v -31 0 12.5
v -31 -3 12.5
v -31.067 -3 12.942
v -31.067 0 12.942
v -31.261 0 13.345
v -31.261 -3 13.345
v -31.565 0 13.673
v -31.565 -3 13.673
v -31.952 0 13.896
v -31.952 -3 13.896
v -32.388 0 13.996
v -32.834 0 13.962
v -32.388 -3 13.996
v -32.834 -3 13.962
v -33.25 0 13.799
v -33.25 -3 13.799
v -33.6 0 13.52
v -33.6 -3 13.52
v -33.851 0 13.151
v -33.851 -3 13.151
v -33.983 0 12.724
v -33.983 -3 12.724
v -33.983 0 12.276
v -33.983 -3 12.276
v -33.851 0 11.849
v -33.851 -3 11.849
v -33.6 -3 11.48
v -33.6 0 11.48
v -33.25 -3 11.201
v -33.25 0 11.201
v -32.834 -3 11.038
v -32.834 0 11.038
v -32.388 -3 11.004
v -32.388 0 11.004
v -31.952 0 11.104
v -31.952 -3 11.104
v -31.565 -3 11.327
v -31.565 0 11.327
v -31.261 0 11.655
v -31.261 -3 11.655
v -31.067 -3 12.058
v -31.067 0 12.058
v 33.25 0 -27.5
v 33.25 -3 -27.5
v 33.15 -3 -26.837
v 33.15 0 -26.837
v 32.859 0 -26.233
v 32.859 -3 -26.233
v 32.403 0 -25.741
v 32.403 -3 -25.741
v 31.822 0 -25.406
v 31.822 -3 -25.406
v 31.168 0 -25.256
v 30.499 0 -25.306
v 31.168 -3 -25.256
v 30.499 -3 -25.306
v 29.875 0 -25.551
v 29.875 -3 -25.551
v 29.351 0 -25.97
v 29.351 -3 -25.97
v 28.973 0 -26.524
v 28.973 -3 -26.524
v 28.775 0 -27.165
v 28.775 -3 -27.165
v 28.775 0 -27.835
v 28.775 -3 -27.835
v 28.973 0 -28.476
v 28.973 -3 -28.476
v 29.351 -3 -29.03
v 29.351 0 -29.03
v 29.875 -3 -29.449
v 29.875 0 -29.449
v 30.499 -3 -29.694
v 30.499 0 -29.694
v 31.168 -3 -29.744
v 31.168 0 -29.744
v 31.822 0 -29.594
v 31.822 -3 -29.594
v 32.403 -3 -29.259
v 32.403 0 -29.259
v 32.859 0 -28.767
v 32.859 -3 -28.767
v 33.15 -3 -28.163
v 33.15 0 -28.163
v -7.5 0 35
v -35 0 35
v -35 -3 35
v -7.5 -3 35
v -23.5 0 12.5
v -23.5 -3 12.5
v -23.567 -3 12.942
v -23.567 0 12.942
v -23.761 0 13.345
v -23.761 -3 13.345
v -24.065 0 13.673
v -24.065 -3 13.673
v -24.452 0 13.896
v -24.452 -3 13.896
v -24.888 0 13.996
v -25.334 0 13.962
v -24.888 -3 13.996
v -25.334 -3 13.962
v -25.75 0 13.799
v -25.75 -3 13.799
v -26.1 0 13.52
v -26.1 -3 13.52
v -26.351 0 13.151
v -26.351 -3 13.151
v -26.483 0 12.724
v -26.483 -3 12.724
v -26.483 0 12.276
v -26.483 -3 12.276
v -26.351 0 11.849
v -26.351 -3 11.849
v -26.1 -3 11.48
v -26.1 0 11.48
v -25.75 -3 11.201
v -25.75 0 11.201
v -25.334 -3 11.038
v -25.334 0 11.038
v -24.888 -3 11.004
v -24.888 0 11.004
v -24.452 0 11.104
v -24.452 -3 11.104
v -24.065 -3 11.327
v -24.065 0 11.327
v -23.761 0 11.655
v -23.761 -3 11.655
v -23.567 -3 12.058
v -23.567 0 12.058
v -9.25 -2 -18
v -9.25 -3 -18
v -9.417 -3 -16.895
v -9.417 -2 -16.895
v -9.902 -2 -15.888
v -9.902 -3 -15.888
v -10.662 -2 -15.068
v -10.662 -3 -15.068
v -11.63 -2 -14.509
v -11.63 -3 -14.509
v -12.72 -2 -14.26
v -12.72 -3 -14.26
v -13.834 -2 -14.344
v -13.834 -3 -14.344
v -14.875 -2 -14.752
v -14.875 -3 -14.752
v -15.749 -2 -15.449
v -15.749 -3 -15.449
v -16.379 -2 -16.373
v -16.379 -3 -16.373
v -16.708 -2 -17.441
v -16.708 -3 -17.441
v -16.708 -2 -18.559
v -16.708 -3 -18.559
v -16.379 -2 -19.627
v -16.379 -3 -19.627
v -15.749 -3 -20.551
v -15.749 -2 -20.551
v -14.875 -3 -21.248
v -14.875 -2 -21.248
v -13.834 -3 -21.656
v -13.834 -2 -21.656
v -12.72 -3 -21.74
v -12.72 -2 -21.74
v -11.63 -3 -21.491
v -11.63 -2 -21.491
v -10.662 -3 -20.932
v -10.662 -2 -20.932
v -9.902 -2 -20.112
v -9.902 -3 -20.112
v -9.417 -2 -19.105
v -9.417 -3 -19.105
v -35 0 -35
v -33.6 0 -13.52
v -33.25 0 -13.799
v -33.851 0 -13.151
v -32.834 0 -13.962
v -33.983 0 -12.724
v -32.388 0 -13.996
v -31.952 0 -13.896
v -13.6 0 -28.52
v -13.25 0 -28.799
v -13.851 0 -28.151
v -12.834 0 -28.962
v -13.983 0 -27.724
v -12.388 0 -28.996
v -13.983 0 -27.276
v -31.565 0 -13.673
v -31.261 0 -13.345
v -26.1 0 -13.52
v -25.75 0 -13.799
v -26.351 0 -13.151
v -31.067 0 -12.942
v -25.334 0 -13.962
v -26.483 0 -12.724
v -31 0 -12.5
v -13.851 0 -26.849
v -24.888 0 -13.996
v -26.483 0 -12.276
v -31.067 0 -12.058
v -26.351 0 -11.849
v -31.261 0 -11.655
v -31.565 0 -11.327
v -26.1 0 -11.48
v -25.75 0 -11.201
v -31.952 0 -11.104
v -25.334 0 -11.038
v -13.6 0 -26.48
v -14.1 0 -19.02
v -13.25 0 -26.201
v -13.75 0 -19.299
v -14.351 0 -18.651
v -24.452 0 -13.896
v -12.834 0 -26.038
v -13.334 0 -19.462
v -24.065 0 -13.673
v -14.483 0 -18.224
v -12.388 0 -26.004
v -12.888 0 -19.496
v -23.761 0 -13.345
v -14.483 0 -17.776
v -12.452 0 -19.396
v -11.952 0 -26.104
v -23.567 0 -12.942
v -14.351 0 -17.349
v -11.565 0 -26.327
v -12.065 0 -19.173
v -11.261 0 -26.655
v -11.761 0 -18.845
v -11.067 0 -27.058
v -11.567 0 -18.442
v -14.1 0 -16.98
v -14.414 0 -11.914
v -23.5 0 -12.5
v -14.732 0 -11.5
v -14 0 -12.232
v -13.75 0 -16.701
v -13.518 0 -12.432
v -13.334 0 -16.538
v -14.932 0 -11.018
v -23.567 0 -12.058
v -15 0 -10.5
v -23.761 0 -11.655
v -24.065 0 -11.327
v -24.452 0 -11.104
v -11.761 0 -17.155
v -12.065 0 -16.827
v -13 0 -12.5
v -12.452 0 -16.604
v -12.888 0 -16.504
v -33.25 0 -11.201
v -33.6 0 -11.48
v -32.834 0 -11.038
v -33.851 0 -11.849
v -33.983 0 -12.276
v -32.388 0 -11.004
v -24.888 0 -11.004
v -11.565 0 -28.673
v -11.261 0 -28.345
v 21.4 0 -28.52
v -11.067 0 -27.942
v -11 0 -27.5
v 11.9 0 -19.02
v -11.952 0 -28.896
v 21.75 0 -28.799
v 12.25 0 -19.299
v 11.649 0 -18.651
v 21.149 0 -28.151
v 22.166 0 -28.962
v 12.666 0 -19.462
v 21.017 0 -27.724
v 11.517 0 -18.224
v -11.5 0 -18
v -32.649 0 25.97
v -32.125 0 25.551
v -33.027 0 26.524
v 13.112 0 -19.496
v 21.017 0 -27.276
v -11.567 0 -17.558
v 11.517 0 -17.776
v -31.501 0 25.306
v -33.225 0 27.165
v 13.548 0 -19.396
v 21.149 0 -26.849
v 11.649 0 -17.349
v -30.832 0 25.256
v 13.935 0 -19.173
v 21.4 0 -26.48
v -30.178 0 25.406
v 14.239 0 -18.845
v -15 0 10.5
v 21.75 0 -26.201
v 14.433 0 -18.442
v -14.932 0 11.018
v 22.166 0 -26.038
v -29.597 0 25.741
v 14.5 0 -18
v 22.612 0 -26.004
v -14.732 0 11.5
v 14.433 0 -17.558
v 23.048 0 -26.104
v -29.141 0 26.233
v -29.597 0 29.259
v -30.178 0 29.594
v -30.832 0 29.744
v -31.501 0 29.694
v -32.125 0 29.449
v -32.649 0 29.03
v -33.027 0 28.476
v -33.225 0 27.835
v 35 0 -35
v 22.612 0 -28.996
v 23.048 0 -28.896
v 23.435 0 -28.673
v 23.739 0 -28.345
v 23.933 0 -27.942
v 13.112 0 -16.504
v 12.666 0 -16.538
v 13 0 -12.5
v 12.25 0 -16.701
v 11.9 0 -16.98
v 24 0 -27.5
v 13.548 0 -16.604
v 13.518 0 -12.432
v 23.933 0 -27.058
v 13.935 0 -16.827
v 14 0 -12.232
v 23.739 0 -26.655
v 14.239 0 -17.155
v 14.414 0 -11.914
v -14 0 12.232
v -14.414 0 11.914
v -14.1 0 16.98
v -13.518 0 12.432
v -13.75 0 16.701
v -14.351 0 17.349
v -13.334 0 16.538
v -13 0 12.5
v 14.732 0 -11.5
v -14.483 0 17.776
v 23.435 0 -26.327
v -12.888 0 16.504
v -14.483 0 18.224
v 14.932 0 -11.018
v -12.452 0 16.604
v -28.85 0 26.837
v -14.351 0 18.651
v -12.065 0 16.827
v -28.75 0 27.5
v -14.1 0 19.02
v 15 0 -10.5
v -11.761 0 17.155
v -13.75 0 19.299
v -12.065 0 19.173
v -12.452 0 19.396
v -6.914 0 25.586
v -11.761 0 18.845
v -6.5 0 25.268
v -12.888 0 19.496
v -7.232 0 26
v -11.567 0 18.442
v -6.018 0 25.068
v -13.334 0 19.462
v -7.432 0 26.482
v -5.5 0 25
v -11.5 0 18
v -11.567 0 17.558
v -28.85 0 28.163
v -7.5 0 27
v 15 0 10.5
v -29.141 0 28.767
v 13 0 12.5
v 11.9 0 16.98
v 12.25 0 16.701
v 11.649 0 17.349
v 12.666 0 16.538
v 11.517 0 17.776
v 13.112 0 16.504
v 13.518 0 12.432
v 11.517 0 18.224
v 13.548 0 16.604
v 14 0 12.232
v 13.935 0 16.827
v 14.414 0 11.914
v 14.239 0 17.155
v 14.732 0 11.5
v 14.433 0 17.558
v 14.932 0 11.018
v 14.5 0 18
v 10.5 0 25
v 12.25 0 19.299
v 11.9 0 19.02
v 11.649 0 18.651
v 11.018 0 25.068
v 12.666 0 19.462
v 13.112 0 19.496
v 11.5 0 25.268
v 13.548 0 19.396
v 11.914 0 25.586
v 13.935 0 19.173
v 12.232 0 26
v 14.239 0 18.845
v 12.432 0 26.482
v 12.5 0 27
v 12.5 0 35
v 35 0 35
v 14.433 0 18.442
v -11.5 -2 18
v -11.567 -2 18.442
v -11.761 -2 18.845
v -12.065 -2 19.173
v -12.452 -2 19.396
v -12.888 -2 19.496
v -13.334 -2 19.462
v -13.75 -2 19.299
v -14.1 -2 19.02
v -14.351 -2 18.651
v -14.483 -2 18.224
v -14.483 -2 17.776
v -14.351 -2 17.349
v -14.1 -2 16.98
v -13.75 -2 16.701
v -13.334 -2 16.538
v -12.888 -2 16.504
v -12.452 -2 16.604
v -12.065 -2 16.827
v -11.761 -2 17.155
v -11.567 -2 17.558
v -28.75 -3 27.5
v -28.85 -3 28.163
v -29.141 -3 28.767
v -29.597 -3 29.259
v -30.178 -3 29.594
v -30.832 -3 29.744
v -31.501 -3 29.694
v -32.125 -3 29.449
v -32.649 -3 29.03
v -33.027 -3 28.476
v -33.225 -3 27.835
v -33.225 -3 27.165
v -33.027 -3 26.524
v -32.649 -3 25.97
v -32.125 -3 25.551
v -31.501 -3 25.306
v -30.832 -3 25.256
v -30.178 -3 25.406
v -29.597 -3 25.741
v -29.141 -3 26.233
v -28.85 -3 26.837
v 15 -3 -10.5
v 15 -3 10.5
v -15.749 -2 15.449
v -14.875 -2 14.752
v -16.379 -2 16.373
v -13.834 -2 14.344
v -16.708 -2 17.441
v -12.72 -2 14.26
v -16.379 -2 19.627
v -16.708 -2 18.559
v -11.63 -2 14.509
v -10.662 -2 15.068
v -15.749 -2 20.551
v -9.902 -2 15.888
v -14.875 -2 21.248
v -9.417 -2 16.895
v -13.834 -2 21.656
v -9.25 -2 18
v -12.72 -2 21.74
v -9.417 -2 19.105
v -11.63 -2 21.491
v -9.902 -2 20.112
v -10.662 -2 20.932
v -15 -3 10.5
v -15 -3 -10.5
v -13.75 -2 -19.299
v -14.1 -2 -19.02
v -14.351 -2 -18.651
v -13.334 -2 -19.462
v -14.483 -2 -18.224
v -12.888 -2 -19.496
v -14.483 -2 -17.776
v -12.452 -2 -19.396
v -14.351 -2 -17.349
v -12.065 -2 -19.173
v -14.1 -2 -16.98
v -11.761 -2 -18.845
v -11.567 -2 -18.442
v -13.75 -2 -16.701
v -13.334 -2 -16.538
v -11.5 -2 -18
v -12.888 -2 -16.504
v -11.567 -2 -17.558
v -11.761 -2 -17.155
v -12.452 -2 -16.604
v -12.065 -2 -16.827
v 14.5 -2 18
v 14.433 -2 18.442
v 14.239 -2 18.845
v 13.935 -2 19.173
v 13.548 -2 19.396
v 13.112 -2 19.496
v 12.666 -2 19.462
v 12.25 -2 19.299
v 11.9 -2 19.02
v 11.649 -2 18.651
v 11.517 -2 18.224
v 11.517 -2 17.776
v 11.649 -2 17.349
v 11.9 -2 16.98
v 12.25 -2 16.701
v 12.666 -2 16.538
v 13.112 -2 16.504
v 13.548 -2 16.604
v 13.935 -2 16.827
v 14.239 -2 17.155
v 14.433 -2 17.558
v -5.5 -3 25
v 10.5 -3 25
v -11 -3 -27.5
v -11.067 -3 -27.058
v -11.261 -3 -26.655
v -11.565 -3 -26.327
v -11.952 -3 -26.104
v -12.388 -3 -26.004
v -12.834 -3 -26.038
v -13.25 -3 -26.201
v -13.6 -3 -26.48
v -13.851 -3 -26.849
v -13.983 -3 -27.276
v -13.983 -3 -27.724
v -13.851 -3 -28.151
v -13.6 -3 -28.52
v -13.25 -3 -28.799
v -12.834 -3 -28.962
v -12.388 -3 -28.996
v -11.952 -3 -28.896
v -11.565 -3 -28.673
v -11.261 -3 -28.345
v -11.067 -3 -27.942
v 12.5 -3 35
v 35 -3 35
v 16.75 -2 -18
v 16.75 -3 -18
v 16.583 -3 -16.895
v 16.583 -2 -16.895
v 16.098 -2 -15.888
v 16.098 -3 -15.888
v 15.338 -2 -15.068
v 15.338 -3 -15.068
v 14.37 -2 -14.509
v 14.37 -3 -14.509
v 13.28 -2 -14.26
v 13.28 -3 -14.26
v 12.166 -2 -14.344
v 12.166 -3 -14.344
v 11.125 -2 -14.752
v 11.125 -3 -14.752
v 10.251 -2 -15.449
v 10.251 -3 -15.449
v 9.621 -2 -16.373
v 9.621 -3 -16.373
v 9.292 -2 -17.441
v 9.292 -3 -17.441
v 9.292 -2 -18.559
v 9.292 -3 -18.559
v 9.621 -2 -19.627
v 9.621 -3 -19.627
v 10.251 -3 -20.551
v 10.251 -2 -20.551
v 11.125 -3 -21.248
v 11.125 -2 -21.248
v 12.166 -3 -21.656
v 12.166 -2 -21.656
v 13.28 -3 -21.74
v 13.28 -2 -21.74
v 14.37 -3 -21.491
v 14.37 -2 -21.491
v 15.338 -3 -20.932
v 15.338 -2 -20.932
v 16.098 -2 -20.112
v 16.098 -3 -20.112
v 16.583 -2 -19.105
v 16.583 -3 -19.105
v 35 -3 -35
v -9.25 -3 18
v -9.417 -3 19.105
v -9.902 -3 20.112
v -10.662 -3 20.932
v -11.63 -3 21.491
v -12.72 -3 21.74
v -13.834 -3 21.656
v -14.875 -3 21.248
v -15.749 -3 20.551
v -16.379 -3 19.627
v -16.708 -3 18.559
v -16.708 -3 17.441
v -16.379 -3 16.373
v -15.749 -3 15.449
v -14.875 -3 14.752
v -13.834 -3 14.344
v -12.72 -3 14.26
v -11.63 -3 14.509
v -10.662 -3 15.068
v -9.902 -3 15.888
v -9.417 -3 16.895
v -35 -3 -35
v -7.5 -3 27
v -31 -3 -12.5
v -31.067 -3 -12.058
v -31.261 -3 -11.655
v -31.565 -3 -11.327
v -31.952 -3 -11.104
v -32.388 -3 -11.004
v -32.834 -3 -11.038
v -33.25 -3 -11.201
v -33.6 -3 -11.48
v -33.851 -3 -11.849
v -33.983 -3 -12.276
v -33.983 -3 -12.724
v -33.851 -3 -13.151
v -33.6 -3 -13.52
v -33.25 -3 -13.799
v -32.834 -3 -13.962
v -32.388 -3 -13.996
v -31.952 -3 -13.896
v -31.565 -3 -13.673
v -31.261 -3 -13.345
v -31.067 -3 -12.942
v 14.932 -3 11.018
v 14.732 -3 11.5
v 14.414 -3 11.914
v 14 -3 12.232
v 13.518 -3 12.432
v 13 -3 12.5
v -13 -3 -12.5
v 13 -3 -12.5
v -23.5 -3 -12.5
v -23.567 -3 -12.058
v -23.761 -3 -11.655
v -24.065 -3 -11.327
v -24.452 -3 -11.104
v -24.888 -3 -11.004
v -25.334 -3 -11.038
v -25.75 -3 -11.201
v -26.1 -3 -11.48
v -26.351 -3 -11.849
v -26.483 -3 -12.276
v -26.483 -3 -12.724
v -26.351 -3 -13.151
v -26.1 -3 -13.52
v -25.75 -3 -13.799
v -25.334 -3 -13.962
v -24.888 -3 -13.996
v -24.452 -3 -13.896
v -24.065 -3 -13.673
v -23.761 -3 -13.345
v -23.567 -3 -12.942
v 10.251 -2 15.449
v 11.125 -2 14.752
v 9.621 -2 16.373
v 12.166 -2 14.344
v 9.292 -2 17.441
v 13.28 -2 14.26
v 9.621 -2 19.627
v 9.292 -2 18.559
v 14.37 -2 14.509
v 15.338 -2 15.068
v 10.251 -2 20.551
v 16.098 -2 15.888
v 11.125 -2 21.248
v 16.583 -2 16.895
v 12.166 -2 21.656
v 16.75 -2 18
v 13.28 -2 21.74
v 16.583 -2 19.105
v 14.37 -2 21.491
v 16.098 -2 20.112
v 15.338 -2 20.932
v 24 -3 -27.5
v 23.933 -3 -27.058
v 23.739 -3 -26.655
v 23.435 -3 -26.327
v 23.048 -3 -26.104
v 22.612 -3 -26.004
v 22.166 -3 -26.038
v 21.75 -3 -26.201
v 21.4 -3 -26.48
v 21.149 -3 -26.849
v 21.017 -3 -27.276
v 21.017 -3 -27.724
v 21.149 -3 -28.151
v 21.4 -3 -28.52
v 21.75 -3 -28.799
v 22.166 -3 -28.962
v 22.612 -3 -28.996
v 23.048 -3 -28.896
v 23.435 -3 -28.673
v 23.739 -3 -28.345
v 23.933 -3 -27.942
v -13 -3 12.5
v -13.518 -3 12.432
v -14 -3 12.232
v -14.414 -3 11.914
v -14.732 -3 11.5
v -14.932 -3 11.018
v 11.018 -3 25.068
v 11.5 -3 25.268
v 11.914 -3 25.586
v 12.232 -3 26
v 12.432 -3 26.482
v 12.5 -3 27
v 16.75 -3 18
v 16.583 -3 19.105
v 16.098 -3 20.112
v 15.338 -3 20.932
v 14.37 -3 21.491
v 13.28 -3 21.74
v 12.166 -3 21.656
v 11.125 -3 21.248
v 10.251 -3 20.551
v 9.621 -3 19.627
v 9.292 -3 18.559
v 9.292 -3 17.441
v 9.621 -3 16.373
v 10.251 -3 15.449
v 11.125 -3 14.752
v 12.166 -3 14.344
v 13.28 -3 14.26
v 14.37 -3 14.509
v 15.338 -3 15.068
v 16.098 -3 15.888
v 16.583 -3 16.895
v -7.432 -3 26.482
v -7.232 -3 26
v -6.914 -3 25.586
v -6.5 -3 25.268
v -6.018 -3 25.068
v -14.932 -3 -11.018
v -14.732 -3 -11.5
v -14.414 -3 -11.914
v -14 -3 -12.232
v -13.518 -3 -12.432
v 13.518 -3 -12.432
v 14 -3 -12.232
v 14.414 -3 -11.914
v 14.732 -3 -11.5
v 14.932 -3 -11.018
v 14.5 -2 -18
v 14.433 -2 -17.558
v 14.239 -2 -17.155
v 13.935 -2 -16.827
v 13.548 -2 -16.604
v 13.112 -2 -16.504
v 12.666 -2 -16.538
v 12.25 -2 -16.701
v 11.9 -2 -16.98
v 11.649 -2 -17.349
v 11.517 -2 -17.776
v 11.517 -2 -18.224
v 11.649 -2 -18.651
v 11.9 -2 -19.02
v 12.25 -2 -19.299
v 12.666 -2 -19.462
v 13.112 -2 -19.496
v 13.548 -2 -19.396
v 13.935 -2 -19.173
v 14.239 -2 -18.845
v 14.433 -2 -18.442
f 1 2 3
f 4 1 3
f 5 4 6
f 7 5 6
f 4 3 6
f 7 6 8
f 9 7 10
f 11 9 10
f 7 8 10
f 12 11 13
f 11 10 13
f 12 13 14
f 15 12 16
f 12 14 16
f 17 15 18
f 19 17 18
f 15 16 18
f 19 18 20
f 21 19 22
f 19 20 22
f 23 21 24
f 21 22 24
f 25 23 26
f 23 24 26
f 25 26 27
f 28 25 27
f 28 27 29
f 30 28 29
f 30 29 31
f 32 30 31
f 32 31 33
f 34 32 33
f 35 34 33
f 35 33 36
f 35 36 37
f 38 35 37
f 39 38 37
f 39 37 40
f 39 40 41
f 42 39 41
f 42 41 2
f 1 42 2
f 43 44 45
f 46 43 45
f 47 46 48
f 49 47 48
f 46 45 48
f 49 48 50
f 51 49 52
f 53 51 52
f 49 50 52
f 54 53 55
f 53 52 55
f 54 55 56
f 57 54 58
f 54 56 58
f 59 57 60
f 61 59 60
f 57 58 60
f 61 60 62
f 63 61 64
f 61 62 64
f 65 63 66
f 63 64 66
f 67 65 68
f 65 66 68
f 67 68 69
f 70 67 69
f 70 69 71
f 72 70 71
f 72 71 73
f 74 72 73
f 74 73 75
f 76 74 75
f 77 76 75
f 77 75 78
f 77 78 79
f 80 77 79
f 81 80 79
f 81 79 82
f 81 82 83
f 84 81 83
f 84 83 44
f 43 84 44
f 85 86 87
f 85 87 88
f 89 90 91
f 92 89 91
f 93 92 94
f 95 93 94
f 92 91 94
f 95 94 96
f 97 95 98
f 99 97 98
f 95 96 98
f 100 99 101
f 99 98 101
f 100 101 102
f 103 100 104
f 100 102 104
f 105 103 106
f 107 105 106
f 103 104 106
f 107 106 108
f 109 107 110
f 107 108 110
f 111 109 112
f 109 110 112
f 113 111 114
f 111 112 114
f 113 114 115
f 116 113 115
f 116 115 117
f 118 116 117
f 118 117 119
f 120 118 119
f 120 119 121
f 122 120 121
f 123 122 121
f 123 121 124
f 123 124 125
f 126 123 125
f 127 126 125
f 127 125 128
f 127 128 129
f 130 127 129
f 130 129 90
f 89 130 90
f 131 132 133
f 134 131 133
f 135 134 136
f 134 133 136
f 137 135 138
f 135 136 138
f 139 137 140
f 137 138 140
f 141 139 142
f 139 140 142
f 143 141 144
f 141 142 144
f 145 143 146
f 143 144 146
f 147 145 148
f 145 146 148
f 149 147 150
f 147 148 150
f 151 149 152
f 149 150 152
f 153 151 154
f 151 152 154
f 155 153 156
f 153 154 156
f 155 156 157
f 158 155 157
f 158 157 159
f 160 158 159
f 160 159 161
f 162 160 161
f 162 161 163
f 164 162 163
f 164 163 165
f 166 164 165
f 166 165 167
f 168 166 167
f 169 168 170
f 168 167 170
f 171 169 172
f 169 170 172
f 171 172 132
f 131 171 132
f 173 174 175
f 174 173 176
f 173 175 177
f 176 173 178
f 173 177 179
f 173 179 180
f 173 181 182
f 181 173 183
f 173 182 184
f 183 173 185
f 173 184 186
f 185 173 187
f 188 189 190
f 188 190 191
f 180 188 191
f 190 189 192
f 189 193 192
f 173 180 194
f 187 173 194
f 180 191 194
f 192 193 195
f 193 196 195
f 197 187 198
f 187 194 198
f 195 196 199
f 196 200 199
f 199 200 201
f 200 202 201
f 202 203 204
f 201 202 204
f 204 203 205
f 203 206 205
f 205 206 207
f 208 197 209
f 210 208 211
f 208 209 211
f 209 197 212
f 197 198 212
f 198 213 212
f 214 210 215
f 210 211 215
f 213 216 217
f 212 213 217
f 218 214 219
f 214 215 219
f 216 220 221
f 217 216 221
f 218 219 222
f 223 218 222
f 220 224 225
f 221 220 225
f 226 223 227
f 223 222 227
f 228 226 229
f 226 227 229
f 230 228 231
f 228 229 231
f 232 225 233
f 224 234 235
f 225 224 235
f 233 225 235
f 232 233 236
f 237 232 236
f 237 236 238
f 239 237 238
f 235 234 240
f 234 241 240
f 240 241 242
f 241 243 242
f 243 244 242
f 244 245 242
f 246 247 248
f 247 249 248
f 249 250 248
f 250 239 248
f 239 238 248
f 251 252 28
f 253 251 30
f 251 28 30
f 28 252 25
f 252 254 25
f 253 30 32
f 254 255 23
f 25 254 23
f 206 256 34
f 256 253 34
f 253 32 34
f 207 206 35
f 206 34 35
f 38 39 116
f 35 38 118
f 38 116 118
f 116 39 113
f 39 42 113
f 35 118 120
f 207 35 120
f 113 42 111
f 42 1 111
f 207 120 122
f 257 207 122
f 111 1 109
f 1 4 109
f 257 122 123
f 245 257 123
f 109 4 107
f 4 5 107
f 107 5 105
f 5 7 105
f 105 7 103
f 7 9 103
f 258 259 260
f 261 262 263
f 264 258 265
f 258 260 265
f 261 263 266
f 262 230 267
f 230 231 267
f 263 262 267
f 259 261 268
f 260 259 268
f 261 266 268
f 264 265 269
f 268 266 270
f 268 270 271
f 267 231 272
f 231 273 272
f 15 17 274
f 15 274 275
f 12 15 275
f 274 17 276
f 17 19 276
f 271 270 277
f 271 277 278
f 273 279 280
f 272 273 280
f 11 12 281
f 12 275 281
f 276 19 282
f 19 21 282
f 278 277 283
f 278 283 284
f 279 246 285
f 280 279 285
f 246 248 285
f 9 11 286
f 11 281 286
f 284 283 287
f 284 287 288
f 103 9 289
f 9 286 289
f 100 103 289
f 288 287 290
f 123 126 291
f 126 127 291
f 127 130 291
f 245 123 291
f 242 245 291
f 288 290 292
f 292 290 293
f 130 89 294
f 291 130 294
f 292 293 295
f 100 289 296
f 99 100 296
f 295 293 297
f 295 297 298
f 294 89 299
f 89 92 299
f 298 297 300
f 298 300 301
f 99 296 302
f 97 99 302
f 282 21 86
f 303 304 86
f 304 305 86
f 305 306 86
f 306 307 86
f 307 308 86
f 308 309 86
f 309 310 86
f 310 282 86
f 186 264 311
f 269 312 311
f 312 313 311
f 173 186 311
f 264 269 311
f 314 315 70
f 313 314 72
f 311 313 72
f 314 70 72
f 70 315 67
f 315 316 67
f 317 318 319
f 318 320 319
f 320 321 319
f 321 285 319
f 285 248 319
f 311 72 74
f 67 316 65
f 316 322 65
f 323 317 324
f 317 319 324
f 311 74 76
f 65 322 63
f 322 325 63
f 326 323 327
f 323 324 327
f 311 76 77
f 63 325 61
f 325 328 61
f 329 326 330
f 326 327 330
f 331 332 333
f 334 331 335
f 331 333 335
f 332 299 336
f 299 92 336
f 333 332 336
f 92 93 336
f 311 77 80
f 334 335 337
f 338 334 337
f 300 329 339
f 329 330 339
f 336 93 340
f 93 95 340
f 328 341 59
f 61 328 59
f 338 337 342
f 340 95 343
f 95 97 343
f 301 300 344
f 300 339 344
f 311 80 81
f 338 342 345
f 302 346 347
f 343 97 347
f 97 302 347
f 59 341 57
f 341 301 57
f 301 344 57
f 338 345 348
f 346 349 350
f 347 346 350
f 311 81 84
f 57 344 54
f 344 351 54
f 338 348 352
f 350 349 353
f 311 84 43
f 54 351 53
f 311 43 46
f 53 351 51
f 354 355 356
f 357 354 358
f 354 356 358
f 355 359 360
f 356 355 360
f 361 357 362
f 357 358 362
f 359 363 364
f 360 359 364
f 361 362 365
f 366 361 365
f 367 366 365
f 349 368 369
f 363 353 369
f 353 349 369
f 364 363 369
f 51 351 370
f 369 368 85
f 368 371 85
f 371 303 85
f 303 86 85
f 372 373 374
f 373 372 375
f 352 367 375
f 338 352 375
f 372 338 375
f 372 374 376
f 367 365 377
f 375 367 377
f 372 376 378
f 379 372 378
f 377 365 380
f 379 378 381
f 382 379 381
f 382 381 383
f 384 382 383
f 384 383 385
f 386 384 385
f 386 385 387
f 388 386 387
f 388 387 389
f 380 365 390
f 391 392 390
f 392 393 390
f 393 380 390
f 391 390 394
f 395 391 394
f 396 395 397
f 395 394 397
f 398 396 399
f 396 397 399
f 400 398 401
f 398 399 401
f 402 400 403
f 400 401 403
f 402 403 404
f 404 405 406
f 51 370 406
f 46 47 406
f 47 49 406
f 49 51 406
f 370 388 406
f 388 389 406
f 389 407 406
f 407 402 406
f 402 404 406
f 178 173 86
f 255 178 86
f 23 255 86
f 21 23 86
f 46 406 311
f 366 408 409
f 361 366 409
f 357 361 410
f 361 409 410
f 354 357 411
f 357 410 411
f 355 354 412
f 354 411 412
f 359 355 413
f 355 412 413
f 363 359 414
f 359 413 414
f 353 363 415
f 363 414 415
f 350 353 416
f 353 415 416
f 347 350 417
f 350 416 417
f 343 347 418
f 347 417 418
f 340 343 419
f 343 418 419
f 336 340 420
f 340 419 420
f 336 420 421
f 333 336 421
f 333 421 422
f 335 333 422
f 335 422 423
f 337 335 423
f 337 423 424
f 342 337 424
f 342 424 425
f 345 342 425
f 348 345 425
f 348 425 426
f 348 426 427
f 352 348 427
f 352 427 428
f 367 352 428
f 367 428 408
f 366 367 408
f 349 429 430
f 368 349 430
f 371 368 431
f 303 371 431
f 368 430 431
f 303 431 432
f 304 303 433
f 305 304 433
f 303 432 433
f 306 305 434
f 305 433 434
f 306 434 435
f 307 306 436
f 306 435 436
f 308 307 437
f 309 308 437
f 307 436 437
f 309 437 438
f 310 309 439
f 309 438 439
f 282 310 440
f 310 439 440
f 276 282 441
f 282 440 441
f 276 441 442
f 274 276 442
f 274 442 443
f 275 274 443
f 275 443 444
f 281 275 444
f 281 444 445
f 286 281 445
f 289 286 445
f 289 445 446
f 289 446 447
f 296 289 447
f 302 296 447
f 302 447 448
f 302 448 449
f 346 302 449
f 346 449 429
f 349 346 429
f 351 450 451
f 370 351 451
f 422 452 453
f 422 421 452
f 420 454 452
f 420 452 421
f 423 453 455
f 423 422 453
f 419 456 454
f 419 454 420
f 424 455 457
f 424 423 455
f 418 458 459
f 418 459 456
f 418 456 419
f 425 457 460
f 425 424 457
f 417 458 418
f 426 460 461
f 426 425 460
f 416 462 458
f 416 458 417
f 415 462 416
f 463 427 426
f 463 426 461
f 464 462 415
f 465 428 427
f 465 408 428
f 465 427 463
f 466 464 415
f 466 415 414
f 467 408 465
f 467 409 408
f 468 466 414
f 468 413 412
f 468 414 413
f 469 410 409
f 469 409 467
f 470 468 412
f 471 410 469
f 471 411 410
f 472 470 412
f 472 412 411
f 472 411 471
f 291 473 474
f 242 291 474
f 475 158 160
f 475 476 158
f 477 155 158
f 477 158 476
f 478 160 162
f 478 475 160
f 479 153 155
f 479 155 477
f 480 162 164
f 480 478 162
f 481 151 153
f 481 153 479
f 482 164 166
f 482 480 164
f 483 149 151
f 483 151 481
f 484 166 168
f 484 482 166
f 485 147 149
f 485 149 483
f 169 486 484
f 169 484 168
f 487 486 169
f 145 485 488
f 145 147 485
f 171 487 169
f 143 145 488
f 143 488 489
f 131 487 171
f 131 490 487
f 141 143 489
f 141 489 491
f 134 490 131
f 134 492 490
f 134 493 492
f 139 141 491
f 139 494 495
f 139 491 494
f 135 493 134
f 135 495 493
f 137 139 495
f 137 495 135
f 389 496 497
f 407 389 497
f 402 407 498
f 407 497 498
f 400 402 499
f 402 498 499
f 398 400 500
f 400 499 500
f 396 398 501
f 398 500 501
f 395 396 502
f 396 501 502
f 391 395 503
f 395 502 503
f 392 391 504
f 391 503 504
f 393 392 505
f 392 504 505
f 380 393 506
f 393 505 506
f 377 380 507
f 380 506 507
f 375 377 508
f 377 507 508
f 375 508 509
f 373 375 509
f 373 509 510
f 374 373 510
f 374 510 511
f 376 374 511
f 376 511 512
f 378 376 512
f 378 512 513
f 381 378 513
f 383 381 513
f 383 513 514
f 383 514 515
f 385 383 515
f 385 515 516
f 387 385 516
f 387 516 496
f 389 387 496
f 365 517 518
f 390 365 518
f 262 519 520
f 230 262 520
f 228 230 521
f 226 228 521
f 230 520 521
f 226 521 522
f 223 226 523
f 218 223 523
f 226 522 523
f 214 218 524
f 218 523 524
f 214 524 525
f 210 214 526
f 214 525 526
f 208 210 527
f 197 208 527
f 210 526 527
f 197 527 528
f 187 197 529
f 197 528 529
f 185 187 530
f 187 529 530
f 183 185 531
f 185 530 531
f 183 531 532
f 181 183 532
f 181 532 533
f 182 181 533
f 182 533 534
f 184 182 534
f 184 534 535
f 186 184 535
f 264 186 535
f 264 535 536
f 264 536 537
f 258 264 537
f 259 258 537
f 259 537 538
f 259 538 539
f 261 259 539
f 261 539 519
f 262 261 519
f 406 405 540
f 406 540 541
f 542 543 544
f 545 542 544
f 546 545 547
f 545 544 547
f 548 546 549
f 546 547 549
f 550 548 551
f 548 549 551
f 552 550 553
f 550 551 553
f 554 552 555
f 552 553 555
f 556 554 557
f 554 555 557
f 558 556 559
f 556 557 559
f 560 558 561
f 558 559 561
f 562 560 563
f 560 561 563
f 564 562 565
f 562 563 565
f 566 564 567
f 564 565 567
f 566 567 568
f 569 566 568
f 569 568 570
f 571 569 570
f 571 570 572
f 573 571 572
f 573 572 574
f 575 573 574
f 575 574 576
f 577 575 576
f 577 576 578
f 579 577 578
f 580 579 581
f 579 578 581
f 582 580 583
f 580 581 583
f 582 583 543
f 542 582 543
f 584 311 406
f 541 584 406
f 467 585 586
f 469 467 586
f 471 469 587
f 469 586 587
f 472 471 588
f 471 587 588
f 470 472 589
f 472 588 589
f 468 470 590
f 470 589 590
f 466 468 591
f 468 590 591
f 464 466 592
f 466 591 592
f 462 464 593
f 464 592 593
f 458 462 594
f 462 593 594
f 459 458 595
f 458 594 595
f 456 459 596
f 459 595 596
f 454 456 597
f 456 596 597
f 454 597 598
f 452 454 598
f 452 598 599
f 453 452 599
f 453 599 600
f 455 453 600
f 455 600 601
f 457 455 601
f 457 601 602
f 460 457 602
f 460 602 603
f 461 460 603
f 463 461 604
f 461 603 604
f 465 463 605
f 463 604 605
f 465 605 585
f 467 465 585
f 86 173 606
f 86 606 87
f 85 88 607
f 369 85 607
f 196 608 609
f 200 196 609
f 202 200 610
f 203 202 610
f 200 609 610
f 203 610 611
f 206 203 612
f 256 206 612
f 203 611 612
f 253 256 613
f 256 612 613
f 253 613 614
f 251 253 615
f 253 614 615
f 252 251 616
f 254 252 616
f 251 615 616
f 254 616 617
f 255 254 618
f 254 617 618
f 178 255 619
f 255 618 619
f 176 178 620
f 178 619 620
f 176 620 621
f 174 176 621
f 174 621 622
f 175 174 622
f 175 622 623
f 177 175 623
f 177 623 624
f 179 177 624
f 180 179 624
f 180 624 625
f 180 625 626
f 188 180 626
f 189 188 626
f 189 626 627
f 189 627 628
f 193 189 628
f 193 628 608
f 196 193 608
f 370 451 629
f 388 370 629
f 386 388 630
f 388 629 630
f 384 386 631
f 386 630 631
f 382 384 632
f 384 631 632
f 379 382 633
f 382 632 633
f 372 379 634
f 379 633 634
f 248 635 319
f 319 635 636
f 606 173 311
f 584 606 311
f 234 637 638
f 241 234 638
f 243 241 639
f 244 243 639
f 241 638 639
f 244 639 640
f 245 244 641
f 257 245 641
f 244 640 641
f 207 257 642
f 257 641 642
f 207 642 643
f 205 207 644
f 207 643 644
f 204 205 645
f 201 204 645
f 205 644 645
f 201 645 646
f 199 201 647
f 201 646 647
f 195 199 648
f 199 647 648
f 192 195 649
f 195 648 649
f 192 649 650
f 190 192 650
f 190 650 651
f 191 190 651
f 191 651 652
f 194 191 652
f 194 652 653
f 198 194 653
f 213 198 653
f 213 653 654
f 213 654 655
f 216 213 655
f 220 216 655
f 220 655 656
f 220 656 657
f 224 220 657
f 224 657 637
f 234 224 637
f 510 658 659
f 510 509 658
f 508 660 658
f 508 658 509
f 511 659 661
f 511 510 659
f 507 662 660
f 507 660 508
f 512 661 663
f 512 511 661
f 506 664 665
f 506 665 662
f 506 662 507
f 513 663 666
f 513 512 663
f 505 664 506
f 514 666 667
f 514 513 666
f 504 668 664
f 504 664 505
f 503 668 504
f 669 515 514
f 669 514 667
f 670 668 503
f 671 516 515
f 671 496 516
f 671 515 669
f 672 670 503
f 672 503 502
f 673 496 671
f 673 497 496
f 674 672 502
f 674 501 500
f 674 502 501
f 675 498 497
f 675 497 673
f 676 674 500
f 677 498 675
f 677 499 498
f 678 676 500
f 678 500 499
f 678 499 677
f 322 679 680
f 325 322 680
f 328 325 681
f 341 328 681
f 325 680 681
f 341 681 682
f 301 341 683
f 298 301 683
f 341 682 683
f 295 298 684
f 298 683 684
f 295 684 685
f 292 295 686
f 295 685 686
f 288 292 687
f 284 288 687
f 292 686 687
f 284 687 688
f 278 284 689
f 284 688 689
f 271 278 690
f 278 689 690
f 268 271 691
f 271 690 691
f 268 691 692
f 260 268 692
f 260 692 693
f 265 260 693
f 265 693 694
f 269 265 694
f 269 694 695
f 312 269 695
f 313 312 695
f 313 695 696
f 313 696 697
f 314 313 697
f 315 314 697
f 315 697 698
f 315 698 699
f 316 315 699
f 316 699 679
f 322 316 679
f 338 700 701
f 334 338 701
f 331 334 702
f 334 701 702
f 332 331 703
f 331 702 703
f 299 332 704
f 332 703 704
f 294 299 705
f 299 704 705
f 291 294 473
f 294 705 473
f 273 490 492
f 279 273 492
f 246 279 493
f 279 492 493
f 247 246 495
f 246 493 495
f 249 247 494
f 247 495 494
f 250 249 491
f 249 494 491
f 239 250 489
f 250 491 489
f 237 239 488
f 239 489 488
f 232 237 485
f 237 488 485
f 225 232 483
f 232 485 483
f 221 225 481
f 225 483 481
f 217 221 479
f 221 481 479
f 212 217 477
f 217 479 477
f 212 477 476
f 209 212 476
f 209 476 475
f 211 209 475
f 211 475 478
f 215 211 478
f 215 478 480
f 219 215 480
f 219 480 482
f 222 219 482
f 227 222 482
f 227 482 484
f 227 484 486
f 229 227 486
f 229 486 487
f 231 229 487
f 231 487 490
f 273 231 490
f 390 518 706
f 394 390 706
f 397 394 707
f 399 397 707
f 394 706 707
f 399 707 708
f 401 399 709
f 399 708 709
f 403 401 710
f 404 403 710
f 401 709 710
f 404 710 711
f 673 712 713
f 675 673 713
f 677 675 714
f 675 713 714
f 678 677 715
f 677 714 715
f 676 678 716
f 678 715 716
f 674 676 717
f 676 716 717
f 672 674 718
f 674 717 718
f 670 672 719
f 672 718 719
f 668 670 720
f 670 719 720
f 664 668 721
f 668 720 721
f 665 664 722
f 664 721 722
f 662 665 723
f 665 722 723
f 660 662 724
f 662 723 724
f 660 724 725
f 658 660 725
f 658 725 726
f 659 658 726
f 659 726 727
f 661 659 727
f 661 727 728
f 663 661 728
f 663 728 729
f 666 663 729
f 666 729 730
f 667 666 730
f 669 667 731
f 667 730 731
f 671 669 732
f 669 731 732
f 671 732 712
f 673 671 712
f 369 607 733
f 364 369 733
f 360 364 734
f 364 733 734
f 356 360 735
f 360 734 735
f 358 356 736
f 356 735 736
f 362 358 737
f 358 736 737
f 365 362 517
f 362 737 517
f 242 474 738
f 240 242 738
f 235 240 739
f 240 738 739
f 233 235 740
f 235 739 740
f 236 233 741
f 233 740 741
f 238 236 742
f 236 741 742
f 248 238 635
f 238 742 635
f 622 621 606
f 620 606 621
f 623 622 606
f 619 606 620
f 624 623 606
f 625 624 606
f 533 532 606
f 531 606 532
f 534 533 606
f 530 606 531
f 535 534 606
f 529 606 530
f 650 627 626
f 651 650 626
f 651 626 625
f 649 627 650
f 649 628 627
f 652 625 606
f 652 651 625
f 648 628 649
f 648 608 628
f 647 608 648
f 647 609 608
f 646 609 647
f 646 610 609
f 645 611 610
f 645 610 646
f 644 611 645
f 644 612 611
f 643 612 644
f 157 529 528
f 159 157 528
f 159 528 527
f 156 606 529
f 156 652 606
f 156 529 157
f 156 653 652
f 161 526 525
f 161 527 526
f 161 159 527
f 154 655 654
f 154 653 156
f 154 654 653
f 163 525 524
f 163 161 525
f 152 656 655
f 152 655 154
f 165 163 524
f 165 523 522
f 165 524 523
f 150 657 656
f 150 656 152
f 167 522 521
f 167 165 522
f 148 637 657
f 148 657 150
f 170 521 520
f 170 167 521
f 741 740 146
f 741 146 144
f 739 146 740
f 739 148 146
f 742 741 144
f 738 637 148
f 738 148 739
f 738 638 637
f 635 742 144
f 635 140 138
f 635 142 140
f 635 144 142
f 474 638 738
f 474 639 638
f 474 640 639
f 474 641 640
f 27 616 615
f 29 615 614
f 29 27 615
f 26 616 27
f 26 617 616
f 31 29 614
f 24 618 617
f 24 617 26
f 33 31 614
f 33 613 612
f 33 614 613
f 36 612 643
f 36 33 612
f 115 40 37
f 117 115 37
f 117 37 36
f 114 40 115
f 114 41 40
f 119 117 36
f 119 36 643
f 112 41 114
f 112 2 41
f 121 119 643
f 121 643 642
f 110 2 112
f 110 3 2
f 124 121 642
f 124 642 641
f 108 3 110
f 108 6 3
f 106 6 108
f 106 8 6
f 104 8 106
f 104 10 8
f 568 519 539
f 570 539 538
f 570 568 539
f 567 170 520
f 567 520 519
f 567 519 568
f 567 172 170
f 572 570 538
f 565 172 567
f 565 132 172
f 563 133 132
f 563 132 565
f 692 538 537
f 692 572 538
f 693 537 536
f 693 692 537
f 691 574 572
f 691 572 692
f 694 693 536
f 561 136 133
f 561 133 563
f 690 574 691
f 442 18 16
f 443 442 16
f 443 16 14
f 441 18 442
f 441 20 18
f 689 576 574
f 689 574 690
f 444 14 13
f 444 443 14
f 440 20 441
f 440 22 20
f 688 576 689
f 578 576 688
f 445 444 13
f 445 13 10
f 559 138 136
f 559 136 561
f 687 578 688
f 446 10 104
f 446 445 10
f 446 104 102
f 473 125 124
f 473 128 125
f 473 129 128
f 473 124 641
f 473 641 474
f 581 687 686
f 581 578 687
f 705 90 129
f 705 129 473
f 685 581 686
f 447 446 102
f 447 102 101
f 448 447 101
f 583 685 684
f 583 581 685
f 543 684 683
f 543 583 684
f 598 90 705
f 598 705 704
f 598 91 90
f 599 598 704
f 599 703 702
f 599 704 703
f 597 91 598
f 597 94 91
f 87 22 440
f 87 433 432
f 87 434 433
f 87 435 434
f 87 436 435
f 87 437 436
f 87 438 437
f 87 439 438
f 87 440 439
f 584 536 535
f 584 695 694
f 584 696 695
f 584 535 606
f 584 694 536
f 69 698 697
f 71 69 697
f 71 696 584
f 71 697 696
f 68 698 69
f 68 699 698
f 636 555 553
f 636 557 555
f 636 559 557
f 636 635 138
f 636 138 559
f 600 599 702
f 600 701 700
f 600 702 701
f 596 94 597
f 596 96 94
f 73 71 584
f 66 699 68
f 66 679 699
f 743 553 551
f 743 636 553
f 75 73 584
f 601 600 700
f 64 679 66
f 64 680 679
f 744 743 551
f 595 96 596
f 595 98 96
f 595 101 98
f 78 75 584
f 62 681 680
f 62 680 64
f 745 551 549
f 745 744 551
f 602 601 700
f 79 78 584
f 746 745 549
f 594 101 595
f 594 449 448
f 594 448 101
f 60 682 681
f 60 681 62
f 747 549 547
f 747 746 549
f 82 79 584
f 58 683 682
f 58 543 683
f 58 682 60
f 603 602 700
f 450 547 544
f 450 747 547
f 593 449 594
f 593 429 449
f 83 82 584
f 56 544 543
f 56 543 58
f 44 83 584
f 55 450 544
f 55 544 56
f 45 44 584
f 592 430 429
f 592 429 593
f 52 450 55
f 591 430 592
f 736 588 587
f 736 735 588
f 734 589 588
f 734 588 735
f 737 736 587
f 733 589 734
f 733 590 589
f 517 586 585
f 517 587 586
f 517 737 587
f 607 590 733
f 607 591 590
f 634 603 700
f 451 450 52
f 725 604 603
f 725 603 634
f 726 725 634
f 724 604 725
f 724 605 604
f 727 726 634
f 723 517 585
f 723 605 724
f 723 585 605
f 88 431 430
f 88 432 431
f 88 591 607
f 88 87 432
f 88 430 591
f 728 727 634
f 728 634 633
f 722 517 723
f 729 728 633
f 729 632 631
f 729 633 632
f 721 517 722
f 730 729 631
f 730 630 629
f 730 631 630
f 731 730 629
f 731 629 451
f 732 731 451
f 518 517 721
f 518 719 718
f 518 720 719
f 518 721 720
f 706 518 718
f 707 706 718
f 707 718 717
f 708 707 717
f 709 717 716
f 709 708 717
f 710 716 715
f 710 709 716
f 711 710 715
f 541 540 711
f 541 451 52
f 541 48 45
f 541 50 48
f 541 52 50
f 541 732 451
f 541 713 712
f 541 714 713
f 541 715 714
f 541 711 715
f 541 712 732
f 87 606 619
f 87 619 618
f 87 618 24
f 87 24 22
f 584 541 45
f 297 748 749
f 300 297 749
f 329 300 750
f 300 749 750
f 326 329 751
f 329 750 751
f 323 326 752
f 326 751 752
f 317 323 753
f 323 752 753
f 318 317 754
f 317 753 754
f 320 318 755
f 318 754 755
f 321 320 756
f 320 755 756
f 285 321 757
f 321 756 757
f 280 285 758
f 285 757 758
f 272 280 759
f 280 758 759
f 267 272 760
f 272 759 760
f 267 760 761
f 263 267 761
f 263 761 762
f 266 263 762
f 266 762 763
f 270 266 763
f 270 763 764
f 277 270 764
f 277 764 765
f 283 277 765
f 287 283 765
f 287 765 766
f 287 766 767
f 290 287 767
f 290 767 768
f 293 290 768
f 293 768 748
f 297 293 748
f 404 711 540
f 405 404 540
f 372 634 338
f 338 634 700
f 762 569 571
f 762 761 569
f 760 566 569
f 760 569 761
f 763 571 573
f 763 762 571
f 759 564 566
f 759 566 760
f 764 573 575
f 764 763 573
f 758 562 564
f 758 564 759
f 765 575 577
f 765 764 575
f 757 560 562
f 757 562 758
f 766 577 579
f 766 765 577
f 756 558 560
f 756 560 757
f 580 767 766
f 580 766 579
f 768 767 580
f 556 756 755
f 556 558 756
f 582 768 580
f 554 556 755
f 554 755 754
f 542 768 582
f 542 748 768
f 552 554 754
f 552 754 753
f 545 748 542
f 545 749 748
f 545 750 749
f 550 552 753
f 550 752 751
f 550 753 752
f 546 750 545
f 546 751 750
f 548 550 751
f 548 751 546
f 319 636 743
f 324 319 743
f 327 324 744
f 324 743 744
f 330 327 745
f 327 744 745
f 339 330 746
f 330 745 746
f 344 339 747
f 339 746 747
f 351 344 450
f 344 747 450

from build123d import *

# Parameters (mm, degrees)
F0_W     = 70
F0_H     = 70
F1_DEPTH = 3
F2_R     = 2.25
F2_R_2   = 1.5
F3_DEPTH = 3.001
F4_R     = 3.75
F5_DEPTH = 1
F6_R     = 1.5
F7_DEPTH = 3.001
F8_R     = 1.5
F9_DEPTH = 3.001


with BuildPart() as f1:
    # F0 (on Front) → F1 (new body)
    with BuildSketch(Plane.XZ):
        Rectangle(F0_W, F0_H)
    extrude(amount=F1_DEPTH)

    # F2 (on face) → F3 (cut, through all)
    with BuildSketch(Plane.XZ.offset(3)):
        with Locations((-31, 27.5)):
            Circle(F2_R)
        with Locations((31, -27.5)):
            Circle(F2_R)
        with Locations((-13, 18)):
            Circle(F2_R_2)
        with Locations((-13, -18)):
            Circle(F2_R_2)
        with Locations((13, 18)):
            Circle(F2_R_2)
        with Locations((13, -18)):
            Circle(F2_R_2)
        with BuildLine():
            Line((-13, -12.5), (13, -12.5))
            ThreePointArc((13, -12.5), (14.414214, -11.914214), (15, -10.5))
            Line((15, -10.5), (15, 10.5))
            ThreePointArc((15, 10.5), (14.414214, 11.914214), (13, 12.5))
            Line((13, 12.5), (-13, 12.5))
            ThreePointArc((-13, 12.5), (-14.414214, 11.914214), (-15, 10.5))
            Line((-15, 10.5), (-15, -10.5))
            ThreePointArc((-15, -10.5), (-14.414214, -11.914214), (-13, -12.5))
        make_face()
        with BuildLine():
            Line((12.5, 35), (-7.5, 35))
            Line((-7.5, 35), (-7.5, 27))
            ThreePointArc((-7.5, 27), (-6.914214, 25.585786), (-5.5, 25))
            Line((-5.5, 25), (10.5, 25))
            ThreePointArc((10.5, 25), (11.914214, 25.585786), (12.5, 27))
            Line((12.5, 27), (12.5, 35))
        make_face()
    extrude(amount=-F3_DEPTH, mode=Mode.SUBTRACT)

    # F4 (on face) → F5 (cut)
    with BuildSketch(Plane.XZ.offset(3)):
        with Locations((-13, 18)):
            Circle(F4_R)
        with Locations((13, 18)):
            Circle(F4_R)
        with Locations((-13, -18)):
            Circle(F4_R)
        with Locations((13, -18)):
            Circle(F4_R)
    extrude(amount=-F5_DEPTH, mode=Mode.SUBTRACT)

    # F6 (on face) → F7 (cut, through all)
    with BuildSketch(Plane.XZ.offset(3)):
        with Locations((-12.5, -27.5)):
            Circle(F6_R)
        with Locations((22.5, -27.5)):
            Circle(F6_R)
    extrude(amount=-F7_DEPTH, mode=Mode.SUBTRACT)

    # F8 (on face) → F9 (cut, through all)
    with BuildSketch(Plane.XZ.offset(3)):
        with Locations((-25, -12.5)):
            Circle(F8_R)
        with Locations((-25, 12.5)):
            Circle(F8_R)
        with Locations((-32.5, -12.5)):
            Circle(F8_R)
        with Locations((-32.5, 12.5)):
            Circle(F8_R)
    extrude(amount=-F9_DEPTH, mode=Mode.SUBTRACT)


solid = f1.part
